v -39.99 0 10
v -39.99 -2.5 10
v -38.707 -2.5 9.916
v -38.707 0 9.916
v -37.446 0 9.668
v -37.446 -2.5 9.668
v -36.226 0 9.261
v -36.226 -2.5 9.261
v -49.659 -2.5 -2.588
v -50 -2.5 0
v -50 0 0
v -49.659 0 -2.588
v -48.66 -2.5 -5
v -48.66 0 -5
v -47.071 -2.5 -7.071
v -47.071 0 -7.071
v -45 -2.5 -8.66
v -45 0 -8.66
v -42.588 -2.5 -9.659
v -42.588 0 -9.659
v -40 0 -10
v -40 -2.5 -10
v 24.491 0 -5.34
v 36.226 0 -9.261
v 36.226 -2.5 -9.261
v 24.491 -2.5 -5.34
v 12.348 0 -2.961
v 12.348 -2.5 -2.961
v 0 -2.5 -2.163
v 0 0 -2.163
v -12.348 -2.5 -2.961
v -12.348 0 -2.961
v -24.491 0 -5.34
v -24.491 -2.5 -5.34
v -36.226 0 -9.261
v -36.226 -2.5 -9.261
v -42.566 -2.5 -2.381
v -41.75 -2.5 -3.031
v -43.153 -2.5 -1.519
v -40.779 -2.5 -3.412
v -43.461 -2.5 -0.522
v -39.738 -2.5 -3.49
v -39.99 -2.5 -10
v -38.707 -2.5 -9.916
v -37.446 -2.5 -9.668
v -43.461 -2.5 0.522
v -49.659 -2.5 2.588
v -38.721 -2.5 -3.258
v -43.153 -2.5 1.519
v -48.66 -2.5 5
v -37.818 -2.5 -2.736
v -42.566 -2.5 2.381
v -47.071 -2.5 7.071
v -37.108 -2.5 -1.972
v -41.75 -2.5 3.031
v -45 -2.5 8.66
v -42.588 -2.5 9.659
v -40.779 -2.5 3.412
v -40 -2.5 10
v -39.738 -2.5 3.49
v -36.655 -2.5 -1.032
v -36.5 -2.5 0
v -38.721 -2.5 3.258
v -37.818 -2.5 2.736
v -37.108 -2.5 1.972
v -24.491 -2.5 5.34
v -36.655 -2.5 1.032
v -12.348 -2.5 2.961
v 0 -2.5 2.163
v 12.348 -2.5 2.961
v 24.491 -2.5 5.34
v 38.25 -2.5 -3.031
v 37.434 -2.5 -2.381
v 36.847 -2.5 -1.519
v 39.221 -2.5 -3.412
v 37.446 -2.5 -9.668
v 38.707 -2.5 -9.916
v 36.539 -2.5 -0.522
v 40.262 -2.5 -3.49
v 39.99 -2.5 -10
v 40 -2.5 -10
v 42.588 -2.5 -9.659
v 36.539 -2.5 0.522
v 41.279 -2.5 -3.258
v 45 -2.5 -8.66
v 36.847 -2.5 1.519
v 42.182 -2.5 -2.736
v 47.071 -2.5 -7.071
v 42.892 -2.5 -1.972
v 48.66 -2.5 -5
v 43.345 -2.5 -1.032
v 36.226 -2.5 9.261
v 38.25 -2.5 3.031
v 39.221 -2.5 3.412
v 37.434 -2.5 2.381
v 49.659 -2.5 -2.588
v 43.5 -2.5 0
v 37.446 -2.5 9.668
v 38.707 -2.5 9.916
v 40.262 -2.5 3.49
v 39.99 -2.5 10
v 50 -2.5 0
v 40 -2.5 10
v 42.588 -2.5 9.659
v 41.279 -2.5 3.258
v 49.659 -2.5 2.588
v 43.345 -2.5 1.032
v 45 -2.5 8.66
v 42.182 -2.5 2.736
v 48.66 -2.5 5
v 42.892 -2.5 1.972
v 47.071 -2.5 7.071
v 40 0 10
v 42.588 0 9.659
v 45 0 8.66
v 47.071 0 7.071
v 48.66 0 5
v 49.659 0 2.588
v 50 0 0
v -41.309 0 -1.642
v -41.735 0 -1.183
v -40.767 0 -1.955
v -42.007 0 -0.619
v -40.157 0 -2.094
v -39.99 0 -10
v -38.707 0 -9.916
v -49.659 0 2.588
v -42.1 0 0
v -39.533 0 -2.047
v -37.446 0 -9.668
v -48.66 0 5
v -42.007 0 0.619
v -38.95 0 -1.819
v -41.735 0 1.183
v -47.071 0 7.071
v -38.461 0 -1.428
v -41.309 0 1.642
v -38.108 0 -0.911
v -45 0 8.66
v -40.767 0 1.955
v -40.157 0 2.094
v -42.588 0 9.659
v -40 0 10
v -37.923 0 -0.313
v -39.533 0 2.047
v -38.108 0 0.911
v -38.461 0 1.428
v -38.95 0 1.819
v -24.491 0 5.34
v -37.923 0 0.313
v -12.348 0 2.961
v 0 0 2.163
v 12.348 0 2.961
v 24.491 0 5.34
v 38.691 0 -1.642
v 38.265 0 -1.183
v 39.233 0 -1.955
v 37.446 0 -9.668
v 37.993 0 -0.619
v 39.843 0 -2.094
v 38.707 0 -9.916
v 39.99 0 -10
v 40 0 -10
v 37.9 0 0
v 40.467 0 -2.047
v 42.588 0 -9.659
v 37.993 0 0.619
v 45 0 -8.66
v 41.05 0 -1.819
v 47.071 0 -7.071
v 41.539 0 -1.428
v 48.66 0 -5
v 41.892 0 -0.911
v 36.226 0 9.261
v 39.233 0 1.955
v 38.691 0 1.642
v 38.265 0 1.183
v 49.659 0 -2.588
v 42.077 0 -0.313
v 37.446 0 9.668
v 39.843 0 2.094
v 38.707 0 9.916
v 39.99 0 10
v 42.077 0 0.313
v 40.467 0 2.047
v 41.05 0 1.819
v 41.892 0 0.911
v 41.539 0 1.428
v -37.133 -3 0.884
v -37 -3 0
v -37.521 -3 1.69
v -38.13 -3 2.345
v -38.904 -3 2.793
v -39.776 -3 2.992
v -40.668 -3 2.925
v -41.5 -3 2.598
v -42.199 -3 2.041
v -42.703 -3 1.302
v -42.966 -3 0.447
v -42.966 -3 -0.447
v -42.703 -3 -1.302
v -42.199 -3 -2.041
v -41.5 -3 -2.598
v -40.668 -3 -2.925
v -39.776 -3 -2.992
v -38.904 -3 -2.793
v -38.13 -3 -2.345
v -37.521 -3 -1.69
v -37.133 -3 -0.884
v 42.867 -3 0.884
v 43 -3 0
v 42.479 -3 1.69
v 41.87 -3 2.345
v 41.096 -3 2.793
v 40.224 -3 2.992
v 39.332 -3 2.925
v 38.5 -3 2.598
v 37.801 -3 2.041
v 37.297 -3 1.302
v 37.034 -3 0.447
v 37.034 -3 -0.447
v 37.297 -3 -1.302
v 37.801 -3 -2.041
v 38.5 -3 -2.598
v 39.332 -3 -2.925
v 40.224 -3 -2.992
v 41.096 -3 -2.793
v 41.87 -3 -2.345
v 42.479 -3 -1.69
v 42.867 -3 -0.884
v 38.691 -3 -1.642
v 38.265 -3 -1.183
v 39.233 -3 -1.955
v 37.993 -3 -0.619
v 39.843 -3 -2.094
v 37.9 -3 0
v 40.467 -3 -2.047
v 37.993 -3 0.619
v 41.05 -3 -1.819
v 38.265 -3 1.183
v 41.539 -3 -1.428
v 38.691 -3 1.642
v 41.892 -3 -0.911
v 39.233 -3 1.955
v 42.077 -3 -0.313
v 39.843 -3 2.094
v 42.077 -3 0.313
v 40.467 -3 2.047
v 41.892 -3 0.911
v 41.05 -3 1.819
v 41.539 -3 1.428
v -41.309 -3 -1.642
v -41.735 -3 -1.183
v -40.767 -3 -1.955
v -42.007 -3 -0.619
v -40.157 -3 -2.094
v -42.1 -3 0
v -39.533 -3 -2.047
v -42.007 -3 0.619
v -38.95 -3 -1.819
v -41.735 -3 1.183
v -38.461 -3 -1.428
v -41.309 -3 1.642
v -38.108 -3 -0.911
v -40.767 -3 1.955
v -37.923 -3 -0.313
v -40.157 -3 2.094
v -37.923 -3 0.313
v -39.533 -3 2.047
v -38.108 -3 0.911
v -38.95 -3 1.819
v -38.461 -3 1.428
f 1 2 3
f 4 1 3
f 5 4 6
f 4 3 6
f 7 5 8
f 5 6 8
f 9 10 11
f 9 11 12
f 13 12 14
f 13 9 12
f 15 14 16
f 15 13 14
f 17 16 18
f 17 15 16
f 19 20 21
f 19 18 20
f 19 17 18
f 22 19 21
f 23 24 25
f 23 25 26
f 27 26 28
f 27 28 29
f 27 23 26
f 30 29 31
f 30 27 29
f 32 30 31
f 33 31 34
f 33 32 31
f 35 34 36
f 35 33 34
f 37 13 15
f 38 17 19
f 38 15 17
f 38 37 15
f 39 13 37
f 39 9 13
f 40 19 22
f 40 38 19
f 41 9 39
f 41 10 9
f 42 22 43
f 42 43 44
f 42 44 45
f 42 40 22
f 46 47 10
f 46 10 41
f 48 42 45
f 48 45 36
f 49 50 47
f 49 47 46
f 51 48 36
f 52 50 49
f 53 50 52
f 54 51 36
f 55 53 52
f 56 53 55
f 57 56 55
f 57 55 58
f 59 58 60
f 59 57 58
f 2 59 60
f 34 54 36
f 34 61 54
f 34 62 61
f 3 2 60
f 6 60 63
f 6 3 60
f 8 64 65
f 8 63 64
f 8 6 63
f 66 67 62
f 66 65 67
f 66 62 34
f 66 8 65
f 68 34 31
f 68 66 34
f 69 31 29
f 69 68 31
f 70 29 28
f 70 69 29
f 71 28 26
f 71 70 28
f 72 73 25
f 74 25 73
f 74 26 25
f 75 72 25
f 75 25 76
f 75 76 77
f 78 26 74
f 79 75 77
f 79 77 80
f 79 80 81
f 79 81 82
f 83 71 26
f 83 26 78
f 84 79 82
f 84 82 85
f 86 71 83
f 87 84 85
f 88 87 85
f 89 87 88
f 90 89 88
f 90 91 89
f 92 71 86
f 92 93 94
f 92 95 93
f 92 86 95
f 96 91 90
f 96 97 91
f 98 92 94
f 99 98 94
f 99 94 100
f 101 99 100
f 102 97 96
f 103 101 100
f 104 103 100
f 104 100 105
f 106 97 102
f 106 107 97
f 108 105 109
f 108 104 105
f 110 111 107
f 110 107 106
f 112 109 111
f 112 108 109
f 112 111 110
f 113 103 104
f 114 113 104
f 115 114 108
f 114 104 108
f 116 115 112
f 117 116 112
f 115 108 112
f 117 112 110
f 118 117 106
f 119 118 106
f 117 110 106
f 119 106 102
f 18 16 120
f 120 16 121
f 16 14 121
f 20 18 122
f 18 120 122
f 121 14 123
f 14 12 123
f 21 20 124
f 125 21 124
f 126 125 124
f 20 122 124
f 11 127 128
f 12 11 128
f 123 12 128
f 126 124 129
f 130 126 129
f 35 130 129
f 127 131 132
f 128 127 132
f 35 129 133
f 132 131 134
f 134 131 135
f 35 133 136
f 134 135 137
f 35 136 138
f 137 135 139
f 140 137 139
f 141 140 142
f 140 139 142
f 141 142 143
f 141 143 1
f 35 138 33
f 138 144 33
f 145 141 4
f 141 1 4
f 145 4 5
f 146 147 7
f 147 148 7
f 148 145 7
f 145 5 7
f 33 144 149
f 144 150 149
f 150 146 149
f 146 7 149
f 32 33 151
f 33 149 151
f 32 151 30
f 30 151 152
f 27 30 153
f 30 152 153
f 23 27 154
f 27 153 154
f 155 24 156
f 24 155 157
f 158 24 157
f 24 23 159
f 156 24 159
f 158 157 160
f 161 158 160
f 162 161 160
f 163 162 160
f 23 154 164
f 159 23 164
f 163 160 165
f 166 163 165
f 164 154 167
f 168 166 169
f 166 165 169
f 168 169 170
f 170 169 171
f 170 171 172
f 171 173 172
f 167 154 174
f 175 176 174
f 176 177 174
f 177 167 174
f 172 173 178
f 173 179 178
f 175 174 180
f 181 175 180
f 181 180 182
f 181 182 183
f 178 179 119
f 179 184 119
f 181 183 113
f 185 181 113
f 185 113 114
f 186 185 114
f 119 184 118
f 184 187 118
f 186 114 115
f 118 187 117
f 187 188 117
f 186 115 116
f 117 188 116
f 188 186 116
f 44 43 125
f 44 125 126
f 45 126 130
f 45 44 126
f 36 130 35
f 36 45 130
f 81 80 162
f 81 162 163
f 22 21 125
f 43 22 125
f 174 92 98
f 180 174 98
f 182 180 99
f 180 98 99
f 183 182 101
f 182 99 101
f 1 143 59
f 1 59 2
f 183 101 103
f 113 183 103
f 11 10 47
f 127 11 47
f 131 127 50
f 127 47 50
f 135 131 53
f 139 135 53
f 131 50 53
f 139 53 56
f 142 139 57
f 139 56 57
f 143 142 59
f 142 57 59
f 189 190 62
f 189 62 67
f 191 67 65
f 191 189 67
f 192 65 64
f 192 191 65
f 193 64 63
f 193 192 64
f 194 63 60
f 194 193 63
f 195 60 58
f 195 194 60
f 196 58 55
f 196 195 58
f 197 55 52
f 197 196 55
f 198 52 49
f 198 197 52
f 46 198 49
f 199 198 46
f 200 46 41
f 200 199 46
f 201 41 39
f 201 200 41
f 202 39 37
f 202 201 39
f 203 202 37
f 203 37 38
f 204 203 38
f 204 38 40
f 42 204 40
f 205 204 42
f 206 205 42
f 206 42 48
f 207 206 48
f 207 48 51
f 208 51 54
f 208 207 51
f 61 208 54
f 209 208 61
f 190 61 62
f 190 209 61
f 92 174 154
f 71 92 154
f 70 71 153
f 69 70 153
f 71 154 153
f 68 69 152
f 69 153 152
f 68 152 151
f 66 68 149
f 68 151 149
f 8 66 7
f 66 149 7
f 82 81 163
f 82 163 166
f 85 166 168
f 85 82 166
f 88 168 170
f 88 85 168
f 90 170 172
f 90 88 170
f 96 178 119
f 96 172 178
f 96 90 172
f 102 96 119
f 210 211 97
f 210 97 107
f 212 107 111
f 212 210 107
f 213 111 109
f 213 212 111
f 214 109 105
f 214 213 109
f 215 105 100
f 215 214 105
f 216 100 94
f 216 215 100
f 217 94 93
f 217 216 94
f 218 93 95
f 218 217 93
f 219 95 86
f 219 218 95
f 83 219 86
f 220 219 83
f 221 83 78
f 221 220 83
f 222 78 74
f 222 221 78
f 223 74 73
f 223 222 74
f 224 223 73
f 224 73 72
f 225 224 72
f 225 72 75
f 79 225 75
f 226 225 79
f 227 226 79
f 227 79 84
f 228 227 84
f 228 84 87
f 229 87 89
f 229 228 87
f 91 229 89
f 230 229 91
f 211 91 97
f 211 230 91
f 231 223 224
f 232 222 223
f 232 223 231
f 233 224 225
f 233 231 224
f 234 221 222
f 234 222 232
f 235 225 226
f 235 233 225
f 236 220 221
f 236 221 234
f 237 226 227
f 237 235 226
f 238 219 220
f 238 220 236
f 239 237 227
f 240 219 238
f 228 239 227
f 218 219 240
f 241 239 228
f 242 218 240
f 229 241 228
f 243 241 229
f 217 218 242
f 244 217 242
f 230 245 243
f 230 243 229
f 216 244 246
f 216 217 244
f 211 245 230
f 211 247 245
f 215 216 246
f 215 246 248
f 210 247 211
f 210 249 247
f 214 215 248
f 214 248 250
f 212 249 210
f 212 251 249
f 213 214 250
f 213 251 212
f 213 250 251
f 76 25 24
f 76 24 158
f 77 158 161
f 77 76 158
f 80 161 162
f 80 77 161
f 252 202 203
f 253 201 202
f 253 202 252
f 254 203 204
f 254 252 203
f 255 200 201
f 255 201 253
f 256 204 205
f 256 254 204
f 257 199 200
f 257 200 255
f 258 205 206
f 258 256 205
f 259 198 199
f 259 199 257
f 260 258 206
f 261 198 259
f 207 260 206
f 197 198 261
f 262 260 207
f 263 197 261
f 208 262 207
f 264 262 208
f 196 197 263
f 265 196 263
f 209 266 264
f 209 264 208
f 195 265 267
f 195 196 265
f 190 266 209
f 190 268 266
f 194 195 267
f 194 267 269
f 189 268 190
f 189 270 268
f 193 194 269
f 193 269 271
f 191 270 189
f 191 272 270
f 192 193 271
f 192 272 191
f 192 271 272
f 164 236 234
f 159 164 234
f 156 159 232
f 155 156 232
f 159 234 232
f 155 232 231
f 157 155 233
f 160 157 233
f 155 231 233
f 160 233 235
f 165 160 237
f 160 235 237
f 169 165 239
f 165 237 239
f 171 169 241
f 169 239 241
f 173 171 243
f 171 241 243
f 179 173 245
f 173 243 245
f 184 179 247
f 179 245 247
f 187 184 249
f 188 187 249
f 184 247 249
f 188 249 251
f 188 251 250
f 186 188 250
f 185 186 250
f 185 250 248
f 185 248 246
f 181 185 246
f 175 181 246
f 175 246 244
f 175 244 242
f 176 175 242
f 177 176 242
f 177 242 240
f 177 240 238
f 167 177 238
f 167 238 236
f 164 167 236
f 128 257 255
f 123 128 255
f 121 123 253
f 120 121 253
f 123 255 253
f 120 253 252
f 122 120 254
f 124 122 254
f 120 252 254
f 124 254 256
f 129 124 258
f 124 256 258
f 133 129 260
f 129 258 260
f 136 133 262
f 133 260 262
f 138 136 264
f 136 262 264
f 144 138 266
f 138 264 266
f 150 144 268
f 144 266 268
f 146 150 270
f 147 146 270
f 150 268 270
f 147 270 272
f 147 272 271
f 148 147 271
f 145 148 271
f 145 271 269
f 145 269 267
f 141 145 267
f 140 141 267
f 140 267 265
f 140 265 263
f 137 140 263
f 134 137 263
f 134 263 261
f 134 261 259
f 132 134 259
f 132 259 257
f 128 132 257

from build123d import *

# Parameters (mm, degrees)
F0_R     = 6
F1_DEPTH = 2.5
F2_DEPTH = 3
F2_TAPER = 45
F3_D     = 4.2
F4_R     = 9.99999


# Not quite as in the source:
# - a fillet or chamfer is up to 0.001 mm smaller than in the source, because OpenCascade refuses the exact size


with BuildPart() as f1:
    # F0 (on Front) → F1 (new body)
    with BuildSketch(Plane.XZ):
        with BuildLine():
            Line((-50, 16.2119245403), (-50, -10))
            Line((-50, -10), (50, -10))
            Line((50, -10), (50, 16.2119245403))
            ThreePointArc((50, 16.2119245403), (0, 2.1631295345), (-50, 16.2119245403))
        make_face()
        with Locations((-40, 0)):
            Circle(F0_R, mode=Mode.SUBTRACT)
        with Locations((40, 0)):
            Circle(F0_R, mode=Mode.SUBTRACT)
        with Locations((-40, 0)):
            Circle(F0_R)
        with Locations((40, 0)):
            Circle(F0_R)
    extrude(amount=F1_DEPTH)

    # F0 (on Front) → F2 (join)
    with BuildSketch(Plane.XZ):
        with Locations((40, 0)):
            Circle(F0_R)
        with Locations((-40, 0)):
            Circle(F0_R)
    extrude(amount=F2_DEPTH, taper=F2_TAPER)

    # F3 (through all)
    with Locations(Plane(origin=(0, 0, 0), x_dir=(1, 0, 0), z_dir=(0, 1, 0))):
        with Locations((40, 0), (-40, 0)):
            Hole(F3_D / 2)

    # F4 (radius 10 in the source; OpenCascade refuses exactly that, so slightly less here)
    f4_edges = [f1.edges().sort_by_distance(p)[0] for p in [
        (-50, -1.25, 16.211925),
        (50, -1.25, 16.211925),
        (50, -1.25, -10),
        (-50, -1.25, -10),
    ]]
    fillet(f4_edges, radius=F4_R)


with BuildPart() as f5_1:
    # F5: instance of F1
    add(f1.part.mirror(Plane.XY))


with BuildPart() as f1_1:
    add(f1.part)

    # F6: intersect F5_1
    add(f5_1.part, mode=Mode.INTERSECT)


solid = f1_1.part
